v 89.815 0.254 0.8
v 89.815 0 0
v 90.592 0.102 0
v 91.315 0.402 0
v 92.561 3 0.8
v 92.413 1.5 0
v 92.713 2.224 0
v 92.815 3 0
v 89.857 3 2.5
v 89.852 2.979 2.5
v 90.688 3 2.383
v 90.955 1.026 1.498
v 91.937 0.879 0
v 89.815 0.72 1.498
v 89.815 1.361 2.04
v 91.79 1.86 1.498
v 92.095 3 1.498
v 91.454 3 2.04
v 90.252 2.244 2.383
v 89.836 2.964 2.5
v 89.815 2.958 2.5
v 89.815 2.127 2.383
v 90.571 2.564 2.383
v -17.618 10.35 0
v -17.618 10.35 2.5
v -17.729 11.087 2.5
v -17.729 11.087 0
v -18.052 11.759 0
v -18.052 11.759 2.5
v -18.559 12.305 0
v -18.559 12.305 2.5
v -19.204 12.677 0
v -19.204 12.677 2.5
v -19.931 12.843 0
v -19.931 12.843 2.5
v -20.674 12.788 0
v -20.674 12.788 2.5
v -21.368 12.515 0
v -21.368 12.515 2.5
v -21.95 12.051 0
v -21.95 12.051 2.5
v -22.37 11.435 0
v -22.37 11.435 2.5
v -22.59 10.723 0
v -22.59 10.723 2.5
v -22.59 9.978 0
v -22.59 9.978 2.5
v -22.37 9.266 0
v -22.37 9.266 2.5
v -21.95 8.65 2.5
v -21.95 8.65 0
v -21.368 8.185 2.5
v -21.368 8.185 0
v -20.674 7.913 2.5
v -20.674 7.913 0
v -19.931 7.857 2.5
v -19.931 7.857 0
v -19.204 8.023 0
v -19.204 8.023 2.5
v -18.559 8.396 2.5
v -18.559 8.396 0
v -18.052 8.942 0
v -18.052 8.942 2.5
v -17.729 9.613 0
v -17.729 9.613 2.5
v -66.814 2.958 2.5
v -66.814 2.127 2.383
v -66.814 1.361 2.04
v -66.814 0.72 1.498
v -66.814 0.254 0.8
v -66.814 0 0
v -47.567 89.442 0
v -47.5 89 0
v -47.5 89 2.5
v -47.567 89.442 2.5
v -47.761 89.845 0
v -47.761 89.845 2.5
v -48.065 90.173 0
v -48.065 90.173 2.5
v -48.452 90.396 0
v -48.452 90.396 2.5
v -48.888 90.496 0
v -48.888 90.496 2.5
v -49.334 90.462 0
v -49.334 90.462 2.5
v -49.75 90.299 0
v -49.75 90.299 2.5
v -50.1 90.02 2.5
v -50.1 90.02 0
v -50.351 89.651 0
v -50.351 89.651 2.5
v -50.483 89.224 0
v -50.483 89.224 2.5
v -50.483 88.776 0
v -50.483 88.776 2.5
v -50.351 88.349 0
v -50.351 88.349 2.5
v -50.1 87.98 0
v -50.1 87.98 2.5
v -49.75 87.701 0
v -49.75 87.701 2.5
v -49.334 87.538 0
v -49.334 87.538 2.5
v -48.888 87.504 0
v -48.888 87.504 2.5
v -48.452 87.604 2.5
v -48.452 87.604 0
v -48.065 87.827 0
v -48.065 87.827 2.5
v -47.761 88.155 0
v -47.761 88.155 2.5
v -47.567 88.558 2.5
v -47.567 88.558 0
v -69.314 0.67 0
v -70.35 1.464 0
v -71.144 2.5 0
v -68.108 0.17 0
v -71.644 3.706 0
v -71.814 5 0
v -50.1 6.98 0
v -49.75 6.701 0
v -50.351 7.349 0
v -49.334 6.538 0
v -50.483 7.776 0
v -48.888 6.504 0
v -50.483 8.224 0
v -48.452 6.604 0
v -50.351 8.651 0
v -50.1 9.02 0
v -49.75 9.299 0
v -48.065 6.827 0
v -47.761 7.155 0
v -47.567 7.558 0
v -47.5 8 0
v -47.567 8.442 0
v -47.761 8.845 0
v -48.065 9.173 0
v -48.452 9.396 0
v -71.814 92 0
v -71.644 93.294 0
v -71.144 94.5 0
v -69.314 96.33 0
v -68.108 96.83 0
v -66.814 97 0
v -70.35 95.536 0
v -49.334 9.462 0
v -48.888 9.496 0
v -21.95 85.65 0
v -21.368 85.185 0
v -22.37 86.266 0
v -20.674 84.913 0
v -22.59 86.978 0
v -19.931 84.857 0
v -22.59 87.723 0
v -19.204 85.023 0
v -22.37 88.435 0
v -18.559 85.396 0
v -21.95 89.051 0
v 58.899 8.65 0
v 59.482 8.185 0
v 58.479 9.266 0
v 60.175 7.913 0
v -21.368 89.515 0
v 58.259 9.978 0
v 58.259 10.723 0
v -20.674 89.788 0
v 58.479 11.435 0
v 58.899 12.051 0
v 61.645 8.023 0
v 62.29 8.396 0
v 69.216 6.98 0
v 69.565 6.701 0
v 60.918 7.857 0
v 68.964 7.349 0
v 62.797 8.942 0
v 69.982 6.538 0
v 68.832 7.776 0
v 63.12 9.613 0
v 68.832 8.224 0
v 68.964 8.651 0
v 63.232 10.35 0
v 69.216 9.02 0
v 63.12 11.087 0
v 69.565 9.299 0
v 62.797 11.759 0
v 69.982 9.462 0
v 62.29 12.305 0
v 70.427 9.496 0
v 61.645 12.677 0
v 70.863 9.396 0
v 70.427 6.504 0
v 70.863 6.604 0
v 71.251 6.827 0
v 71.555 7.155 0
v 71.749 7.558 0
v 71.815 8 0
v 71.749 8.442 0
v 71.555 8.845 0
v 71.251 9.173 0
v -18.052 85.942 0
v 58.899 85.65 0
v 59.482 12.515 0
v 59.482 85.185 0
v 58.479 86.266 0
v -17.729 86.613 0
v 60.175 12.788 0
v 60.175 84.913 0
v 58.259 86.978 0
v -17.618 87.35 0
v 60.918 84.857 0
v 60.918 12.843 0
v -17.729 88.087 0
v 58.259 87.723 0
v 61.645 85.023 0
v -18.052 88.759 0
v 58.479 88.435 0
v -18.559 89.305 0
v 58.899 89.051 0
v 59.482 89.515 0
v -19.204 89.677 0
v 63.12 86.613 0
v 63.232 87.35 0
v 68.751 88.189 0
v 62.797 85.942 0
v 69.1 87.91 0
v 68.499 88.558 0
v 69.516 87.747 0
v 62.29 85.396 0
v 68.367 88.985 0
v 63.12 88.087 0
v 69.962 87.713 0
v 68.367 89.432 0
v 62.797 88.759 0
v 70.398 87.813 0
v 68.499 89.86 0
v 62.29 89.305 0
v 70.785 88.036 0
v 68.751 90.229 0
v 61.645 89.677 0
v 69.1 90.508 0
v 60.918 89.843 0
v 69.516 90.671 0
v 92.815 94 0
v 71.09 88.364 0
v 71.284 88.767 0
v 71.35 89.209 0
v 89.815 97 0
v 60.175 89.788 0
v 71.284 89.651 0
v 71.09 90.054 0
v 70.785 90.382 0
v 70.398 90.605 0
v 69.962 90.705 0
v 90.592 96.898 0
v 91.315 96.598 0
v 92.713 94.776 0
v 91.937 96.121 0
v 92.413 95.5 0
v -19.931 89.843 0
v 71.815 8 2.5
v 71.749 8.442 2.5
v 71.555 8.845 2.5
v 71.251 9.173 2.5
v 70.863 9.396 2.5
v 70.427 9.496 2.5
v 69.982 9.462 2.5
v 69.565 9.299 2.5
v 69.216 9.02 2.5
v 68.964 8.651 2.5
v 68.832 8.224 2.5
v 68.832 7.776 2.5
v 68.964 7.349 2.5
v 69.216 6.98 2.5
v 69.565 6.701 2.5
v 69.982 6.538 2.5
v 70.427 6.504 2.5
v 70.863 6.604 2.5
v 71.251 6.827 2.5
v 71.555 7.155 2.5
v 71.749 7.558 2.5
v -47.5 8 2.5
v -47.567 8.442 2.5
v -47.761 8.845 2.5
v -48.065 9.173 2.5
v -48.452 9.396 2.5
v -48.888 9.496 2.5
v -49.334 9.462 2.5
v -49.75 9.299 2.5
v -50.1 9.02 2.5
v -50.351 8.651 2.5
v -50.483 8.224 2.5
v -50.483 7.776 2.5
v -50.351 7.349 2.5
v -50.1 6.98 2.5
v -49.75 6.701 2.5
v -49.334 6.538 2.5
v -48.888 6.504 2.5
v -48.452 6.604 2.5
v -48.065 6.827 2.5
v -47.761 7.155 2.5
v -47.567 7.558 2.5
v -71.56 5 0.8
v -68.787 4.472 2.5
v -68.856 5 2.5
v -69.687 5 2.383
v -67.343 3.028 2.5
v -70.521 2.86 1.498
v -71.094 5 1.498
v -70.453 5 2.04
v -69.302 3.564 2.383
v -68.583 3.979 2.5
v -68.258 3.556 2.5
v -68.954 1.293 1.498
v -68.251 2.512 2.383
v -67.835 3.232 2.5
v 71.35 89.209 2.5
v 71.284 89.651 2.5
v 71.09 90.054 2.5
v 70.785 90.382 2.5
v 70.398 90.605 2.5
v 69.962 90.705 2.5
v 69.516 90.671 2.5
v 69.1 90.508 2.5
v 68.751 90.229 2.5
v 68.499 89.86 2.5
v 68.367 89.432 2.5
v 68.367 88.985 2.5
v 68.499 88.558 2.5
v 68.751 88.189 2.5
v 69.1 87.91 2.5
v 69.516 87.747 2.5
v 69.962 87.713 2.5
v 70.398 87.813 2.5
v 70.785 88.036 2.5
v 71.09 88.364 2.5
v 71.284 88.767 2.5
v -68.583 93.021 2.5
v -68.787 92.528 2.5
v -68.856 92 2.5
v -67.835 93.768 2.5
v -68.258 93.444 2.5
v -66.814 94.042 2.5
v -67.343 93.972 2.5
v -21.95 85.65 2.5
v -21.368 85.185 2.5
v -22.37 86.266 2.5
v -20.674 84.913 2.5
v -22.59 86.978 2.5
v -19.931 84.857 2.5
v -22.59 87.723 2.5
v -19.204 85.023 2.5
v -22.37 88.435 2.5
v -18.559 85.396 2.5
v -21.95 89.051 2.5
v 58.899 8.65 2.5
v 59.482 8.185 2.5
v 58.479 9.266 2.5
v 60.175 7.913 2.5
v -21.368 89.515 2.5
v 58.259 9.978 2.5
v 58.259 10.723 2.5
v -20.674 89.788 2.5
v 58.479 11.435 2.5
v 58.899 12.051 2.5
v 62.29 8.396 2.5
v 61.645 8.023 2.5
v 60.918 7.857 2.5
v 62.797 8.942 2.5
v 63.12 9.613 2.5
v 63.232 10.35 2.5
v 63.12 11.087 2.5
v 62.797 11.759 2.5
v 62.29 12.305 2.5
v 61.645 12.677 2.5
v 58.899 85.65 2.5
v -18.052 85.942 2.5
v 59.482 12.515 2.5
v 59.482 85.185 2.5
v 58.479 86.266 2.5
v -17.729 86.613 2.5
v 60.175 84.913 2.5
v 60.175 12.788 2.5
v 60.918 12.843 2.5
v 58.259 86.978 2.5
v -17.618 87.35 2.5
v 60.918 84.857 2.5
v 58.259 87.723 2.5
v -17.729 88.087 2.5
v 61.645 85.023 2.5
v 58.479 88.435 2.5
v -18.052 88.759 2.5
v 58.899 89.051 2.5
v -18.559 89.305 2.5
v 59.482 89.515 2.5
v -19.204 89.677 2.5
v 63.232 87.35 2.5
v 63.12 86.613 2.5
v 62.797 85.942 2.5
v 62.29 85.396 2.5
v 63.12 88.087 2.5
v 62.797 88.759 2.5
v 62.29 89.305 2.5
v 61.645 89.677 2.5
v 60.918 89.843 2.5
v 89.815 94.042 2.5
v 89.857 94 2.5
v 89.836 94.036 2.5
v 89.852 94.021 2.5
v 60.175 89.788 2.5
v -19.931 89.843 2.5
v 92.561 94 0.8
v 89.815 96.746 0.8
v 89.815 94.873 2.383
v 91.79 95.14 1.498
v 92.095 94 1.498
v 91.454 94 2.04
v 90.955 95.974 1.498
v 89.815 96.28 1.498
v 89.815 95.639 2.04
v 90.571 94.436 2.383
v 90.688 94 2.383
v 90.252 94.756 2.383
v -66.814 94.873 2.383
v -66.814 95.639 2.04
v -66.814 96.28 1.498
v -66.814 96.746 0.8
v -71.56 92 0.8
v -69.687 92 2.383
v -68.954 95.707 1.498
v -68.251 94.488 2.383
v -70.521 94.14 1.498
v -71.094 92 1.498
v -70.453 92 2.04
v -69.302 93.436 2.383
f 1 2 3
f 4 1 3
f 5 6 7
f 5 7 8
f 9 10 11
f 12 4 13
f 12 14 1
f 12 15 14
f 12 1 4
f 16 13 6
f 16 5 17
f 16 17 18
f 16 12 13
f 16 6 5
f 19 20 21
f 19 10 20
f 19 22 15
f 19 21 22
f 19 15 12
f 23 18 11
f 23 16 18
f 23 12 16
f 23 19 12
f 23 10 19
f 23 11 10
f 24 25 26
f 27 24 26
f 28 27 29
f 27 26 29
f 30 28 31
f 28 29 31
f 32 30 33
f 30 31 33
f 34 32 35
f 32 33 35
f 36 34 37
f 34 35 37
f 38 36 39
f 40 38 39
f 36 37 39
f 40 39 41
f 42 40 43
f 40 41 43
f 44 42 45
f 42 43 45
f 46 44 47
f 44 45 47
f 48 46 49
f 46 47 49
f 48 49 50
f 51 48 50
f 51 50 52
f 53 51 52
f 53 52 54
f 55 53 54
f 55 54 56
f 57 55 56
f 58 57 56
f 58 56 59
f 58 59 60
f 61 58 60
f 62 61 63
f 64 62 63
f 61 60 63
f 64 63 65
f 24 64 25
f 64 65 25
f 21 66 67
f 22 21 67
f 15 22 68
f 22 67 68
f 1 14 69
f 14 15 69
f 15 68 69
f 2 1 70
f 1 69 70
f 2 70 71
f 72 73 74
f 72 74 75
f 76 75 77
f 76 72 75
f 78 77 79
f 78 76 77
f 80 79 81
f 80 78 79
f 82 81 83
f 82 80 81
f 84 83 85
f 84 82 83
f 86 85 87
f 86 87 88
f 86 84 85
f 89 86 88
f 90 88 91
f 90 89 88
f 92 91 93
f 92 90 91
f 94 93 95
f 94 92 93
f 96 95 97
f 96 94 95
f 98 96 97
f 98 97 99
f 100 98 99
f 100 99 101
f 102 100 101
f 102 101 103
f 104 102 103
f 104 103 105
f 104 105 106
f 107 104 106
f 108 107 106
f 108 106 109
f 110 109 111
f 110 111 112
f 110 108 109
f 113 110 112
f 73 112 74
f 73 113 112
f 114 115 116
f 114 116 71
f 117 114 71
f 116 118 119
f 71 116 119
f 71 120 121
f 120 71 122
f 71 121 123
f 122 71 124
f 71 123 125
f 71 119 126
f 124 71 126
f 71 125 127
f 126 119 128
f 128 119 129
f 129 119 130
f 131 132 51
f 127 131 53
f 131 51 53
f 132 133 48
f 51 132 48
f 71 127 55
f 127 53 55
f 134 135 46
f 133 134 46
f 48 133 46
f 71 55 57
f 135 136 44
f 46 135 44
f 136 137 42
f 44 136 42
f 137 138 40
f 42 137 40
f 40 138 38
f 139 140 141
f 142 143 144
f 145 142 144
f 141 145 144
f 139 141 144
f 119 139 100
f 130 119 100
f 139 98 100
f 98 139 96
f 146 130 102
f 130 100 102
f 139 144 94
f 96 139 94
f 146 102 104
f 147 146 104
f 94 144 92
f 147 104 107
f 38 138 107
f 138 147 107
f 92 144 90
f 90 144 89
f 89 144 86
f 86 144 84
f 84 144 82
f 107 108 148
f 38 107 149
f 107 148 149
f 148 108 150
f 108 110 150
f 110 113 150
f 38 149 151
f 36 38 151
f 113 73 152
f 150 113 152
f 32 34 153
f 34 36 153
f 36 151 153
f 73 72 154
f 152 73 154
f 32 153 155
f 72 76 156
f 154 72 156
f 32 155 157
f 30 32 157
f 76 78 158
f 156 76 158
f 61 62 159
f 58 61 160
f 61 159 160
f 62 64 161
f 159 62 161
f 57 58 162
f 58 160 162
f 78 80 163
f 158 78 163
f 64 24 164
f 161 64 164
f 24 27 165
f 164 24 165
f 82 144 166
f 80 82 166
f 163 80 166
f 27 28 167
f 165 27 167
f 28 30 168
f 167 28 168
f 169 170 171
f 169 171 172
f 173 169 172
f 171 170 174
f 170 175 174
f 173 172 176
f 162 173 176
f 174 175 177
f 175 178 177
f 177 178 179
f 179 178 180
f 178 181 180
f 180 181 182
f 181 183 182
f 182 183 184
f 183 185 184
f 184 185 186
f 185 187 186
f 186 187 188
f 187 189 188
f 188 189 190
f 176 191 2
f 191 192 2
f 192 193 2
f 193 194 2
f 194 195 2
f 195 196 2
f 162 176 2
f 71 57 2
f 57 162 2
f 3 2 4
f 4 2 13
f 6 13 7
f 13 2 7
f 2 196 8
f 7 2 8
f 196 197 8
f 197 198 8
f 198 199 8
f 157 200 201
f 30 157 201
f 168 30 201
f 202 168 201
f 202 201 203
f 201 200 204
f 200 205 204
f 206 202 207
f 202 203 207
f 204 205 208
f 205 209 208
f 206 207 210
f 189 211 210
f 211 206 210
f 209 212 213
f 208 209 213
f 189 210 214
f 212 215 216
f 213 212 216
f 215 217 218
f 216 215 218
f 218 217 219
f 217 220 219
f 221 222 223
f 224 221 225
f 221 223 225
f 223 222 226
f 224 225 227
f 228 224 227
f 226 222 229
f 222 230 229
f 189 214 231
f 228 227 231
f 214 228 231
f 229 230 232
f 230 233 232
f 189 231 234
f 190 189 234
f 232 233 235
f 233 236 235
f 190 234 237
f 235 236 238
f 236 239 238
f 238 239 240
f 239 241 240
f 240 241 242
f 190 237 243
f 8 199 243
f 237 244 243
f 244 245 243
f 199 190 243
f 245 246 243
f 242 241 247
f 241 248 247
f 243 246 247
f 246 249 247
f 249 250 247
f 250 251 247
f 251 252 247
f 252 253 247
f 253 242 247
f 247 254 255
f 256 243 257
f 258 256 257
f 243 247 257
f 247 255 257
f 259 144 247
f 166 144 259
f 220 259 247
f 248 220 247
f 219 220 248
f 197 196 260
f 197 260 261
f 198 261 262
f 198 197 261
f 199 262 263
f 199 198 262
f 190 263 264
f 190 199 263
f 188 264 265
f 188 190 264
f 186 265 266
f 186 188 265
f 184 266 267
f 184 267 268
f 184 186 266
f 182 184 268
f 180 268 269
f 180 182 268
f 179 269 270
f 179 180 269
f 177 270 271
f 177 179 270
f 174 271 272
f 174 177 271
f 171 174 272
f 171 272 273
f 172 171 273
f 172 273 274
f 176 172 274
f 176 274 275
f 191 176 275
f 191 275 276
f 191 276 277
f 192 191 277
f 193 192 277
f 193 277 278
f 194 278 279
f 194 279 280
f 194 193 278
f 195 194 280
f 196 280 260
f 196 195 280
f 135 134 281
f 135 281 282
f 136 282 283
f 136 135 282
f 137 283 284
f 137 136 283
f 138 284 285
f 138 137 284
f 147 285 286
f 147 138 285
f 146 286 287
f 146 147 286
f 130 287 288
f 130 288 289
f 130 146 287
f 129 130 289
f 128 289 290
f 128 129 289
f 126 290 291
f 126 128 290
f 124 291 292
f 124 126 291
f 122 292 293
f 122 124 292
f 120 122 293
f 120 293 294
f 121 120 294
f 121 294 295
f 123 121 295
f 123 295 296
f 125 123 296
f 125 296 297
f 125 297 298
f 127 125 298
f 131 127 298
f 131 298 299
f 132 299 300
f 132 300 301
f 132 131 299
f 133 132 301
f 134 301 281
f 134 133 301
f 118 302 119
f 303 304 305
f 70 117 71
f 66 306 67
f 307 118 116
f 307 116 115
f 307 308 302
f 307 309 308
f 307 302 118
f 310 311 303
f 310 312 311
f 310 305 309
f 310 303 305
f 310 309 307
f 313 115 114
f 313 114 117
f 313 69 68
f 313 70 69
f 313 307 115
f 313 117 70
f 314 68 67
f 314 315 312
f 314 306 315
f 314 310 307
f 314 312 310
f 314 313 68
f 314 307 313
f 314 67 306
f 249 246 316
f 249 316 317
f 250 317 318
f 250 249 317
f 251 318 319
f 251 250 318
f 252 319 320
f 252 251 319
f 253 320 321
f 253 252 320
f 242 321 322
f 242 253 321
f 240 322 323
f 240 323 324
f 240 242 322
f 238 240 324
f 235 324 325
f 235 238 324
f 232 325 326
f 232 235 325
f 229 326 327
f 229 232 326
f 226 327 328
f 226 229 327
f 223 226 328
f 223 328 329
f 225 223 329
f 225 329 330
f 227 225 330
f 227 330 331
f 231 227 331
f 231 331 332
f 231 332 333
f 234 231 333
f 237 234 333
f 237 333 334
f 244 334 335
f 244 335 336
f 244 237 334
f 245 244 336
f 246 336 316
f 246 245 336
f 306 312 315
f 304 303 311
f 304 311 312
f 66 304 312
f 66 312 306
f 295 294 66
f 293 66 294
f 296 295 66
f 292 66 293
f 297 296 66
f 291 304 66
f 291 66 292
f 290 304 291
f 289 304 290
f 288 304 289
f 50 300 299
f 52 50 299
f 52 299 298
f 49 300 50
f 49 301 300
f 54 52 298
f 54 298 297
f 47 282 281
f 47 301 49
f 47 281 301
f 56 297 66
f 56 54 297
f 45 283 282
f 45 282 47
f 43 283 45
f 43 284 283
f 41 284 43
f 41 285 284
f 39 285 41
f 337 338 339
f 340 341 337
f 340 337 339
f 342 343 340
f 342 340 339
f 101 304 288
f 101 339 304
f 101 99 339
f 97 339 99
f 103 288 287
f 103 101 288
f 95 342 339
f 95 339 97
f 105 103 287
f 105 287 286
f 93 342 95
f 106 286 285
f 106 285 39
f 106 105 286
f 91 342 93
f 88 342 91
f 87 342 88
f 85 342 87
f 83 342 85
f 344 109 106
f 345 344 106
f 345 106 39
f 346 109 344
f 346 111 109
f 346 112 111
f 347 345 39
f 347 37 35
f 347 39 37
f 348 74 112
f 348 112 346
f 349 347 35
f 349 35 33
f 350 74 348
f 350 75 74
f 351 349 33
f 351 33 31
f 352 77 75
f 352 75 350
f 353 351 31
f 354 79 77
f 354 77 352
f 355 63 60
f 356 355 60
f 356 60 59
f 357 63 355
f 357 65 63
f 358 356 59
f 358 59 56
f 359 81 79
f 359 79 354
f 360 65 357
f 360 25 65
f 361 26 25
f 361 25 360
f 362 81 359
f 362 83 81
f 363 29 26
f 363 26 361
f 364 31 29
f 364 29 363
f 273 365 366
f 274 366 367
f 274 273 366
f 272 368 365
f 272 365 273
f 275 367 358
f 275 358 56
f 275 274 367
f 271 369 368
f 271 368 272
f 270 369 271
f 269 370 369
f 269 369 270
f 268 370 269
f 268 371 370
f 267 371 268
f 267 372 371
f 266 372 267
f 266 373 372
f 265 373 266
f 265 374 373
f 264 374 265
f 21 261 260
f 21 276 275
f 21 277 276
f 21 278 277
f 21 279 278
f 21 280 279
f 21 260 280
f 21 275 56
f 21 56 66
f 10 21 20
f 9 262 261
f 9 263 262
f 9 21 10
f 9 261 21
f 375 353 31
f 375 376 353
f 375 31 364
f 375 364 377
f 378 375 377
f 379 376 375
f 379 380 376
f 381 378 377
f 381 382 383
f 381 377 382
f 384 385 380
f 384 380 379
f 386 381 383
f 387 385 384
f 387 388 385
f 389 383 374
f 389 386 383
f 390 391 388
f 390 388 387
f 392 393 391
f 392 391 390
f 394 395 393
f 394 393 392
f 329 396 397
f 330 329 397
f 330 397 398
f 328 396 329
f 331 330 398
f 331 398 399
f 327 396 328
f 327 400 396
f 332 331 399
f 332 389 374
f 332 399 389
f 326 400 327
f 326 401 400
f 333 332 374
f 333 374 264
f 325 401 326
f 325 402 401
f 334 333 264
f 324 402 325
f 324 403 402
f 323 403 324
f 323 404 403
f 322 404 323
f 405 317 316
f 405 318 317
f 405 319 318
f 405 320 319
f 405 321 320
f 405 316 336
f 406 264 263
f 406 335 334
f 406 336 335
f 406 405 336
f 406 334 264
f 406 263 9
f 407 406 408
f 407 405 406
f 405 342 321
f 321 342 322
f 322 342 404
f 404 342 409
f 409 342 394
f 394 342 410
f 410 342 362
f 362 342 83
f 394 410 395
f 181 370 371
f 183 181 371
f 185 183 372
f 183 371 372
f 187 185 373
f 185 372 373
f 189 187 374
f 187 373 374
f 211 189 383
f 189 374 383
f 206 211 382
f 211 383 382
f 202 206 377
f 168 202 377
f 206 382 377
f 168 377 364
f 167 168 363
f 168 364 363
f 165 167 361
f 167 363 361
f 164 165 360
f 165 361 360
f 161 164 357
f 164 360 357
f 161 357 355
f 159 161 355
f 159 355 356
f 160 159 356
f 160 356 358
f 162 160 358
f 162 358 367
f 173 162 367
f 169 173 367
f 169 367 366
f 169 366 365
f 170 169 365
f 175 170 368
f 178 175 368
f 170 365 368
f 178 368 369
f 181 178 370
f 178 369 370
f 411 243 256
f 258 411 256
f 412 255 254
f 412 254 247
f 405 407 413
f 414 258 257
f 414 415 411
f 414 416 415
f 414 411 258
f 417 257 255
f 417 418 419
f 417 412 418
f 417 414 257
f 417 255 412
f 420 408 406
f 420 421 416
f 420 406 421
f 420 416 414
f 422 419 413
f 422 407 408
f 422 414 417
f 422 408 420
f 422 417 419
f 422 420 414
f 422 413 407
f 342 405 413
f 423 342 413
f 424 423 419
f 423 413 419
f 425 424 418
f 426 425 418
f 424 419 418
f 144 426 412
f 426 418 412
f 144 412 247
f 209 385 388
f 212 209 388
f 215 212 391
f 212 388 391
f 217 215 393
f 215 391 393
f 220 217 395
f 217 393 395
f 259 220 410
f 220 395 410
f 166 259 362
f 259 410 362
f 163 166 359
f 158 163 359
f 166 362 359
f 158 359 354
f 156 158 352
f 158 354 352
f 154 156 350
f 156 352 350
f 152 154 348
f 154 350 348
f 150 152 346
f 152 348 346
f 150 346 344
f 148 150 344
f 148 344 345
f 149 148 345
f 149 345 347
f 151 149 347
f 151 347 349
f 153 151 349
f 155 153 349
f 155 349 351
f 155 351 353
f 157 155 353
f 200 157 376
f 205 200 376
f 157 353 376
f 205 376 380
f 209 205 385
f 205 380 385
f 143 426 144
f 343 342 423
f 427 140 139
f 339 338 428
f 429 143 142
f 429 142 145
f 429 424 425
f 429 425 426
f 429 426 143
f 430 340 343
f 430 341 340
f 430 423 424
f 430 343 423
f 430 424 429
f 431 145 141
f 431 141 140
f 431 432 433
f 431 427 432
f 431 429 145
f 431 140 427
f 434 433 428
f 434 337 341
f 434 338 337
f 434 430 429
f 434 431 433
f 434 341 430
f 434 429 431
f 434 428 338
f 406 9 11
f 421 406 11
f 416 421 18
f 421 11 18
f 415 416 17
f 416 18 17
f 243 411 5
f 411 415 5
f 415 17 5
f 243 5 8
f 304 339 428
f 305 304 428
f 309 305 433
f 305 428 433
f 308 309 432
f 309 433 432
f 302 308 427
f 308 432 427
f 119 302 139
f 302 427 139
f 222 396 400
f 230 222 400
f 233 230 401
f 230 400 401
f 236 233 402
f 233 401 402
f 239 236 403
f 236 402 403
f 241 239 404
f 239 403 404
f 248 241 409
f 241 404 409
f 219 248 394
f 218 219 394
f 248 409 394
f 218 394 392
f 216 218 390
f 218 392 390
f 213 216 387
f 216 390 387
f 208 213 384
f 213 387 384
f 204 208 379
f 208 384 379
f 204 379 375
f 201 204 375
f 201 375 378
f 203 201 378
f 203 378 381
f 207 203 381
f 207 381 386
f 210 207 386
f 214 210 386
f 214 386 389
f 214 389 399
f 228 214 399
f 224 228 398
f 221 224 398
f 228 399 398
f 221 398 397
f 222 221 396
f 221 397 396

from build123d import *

# Parameters (mm, degrees)
CROQUIS1_R              = 1.5
SALIENTE_EXTRUIR2_DEPTH = 2.5
CROQUIS2_R              = 2.5
CORTAR_EXTRUIR1_DEPTH   = 2.5
REDONDEO1_R             = 3


with BuildPart() as part:
    # Croquis1 → Saliente-Extruir2 (new body)
    with BuildSketch(Plane.XY):
        with BuildLine():
            Line((-71.814275766, 92), (-71.814275766, 5))
            ThreePointArc((-71.814275766, 5), (-70.349809672, 1.464466094), (-66.814275766, 0))
            Line((-66.814275766, 0), (89.815390375, 0))
            ThreePointArc((89.815390375, 0), (91.936710719, 0.878679656), (92.815390375, 3))
            Line((92.815390375, 3), (92.815390375, 94))
            ThreePointArc((92.815390375, 94), (91.936710719, 96.121320344), (89.815390375, 97))
            Line((89.815390375, 97), (-66.814275766, 97))
            ThreePointArc((-66.814275766, 97), (-70.349809672, 95.535533906), (-71.814275766, 92))
        make_face()
        with Locations((69.850202166, 89.208902584)):
            Circle(CROQUIS1_R, mode=Mode.SUBTRACT)
        with Locations((-49, 89)):
            Circle(CROQUIS1_R, mode=Mode.SUBTRACT)
        with Locations((-49, 8)):
            Circle(CROQUIS1_R, mode=Mode.SUBTRACT)
        with Locations((70.315390375, 8)):
            Circle(CROQUIS1_R, mode=Mode.SUBTRACT)
    extrude(amount=SALIENTE_EXTRUIR2_DEPTH)

    # Croquis2 → Cortar-Extruir1 (cut)
    with BuildSketch(Plane.XY.offset(2.5)):
        with Locations((60.731545651, 10.35024669)):
            Circle(CROQUIS2_R)
        with Locations((60.731545651, 87.35024669)):
            Circle(CROQUIS2_R)
        with Locations((-20.117590151, 10.35024669)):
            Circle(CROQUIS2_R)
        with Locations((-20.117590151, 87.35024669)):
            Circle(CROQUIS2_R)
    extrude(amount=-CORTAR_EXTRUIR1_DEPTH, mode=Mode.SUBTRACT)

    # Redondeo1
    # the kernel refuses this fillet: 3 mm, written as the material it takes off along each edge
    with BuildSketch(Plane(origin=(89.815390375, 3, 2.5), x_dir=(0, -1, 0), z_dir=(-1, 0, 0))) as redondeo1_piece_1:
        with BuildLine():
            CenterArc((0.041960108, -3), REDONDEO1_R, 9.594068227, 80.405931773)
            Line((3, -2.5), (3.059160798, -2.49))
            ThreePointArc((3.059160798, -2.49), (3.06, -1.25), (3.06, 0))
            Line((3.06, 0), (3, 0.06))
            Line((3, 0.06), (0.041960108, 0.06))
            Line((0.041960108, 0.06), (0.041960108, 0))
        make_face()
    revolve(axis=Axis((89.815390375, 3, 2.5), (0, 0, 1)), revolution_arc=90, mode=Mode.SUBTRACT)
    with BuildSketch(Plane(origin=(-66.814275766, 0, 2.5), x_dir=(0, 1, 0), z_dir=(1, 0, 0)), Plane(origin=(89.815390375, 97, 2.5), x_dir=(0, -1, 0), z_dir=(-1, 0, 0))) as redondeo1_piece_2:
        with BuildLine():
            CenterArc((2.958039892, -3), REDONDEO1_R, 90, 80.405931773)
            Line((0, -2.5), (-0.059160798, -2.49))
            ThreePointArc((-0.059160798, -2.49), (-0.06, -1.25), (-0.06, 0))
            Line((-0.06, 0), (0, 0.06))
            Line((0, 0.06), (2.958039892, 0.06))
            Line((2.958039892, 0.06), (2.958039892, 0))
        make_face()
    extrude(amount=156.629666142, mode=Mode.SUBTRACT)
    with BuildSketch(Plane(origin=(-66.814275766, 5, 2.5), x_dir=(-1, 0, 0), z_dir=(0, 1, 0))) as redondeo1_piece_3:
        with BuildLine():
            CenterArc((2.041960108, -3), REDONDEO1_R, 9.594068227, 80.405931773)
            Line((2.041960108, 0), (2.041960108, 0.06))
            Line((2.041960108, 0.06), (5, 0.06))
            Line((5, 0.06), (5.06, 0))
            ThreePointArc((5.06, 0), (5.06, -1.25), (5.059160798, -2.49))
            Line((5.059160798, -2.49), (5, -2.5))
        make_face()
    revolve(axis=Axis((-66.814275766, 5, 2.5), (0, 0, 1)), revolution_arc=90, mode=Mode.SUBTRACT)
    with BuildSketch(Plane(origin=(-71.814275766, 92, 2.5), x_dir=(0, 0, -1), z_dir=(0, -1, 0))) as redondeo1_piece_4:
        with BuildLine():
            CenterArc((3, 2.958039892), REDONDEO1_R, 180, 80.405931773)
            Line((0, 2.958039892), (-0.06, 2.958039892))
            Line((-0.06, 2.958039892), (-0.06, 0))
            Line((-0.06, 0), (0, -0.06))
            ThreePointArc((0, -0.06), (1.25, -0.06), (2.49, -0.059160798))
            Line((2.49, -0.059160798), (2.5, 0))
        make_face()
    extrude(amount=87, mode=Mode.SUBTRACT)
    with BuildSketch(Plane(origin=(-66.814275766, 92, 2.5), x_dir=(0, 1, 0), z_dir=(1, 0, 0))) as redondeo1_piece_5:
        with BuildLine():
            CenterArc((2.041960108, -3), REDONDEO1_R, 9.594068227, 80.405931773)
            Line((2.041960108, 0), (2.041960108, 0.06))
            Line((2.041960108, 0.06), (5, 0.06))
            Line((5, 0.06), (5.06, 0))
            ThreePointArc((5.06, 0), (5.06, -1.25), (5.059160798, -2.49))
            Line((5.059160798, -2.49), (5, -2.5))
        make_face()
    revolve(axis=Axis((-66.814275766, 92, 2.5), (0, 0, 1)), revolution_arc=90, mode=Mode.SUBTRACT)
    with BuildSketch(Plane(origin=(89.815390375, 94, 2.5), x_dir=(1, 0, 0), z_dir=(0, -1, 0))) as redondeo1_piece_6:
        with BuildLine():
            CenterArc((0.041960108, -3), REDONDEO1_R, 9.594068227, 80.405931773)
            Line((3, -2.5), (3.059160798, -2.49))
            ThreePointArc((3.059160798, -2.49), (3.06, -1.25), (3.06, 0))
            Line((3.06, 0), (3, 0.06))
            Line((3, 0.06), (0.041960108, 0.06))
            Line((0.041960108, 0.06), (0.041960108, 0))
        make_face()
    revolve(axis=Axis((89.815390375, 94, 2.5), (0, 0, 1)), revolution_arc=90, mode=Mode.SUBTRACT)
    with BuildSketch(Plane(origin=(92.815390375, 3, 2.5), x_dir=(-1, 0, 0), z_dir=(0, 1, 0))) as redondeo1_piece_7:
        with BuildLine():
            CenterArc((2.958039892, -3), REDONDEO1_R, 90, 80.405931773)
            Line((0, -2.5), (-0.059160798, -2.49))
            ThreePointArc((-0.059160798, -2.49), (-0.06, -1.25), (-0.06, 0))
            Line((-0.06, 0), (0, 0.06))
            Line((0, 0.06), (2.958039892, 0.06))
            Line((2.958039892, 0.06), (2.958039892, 0))
        make_face()
    extrude(amount=91, mode=Mode.SUBTRACT)


solid = part.part
